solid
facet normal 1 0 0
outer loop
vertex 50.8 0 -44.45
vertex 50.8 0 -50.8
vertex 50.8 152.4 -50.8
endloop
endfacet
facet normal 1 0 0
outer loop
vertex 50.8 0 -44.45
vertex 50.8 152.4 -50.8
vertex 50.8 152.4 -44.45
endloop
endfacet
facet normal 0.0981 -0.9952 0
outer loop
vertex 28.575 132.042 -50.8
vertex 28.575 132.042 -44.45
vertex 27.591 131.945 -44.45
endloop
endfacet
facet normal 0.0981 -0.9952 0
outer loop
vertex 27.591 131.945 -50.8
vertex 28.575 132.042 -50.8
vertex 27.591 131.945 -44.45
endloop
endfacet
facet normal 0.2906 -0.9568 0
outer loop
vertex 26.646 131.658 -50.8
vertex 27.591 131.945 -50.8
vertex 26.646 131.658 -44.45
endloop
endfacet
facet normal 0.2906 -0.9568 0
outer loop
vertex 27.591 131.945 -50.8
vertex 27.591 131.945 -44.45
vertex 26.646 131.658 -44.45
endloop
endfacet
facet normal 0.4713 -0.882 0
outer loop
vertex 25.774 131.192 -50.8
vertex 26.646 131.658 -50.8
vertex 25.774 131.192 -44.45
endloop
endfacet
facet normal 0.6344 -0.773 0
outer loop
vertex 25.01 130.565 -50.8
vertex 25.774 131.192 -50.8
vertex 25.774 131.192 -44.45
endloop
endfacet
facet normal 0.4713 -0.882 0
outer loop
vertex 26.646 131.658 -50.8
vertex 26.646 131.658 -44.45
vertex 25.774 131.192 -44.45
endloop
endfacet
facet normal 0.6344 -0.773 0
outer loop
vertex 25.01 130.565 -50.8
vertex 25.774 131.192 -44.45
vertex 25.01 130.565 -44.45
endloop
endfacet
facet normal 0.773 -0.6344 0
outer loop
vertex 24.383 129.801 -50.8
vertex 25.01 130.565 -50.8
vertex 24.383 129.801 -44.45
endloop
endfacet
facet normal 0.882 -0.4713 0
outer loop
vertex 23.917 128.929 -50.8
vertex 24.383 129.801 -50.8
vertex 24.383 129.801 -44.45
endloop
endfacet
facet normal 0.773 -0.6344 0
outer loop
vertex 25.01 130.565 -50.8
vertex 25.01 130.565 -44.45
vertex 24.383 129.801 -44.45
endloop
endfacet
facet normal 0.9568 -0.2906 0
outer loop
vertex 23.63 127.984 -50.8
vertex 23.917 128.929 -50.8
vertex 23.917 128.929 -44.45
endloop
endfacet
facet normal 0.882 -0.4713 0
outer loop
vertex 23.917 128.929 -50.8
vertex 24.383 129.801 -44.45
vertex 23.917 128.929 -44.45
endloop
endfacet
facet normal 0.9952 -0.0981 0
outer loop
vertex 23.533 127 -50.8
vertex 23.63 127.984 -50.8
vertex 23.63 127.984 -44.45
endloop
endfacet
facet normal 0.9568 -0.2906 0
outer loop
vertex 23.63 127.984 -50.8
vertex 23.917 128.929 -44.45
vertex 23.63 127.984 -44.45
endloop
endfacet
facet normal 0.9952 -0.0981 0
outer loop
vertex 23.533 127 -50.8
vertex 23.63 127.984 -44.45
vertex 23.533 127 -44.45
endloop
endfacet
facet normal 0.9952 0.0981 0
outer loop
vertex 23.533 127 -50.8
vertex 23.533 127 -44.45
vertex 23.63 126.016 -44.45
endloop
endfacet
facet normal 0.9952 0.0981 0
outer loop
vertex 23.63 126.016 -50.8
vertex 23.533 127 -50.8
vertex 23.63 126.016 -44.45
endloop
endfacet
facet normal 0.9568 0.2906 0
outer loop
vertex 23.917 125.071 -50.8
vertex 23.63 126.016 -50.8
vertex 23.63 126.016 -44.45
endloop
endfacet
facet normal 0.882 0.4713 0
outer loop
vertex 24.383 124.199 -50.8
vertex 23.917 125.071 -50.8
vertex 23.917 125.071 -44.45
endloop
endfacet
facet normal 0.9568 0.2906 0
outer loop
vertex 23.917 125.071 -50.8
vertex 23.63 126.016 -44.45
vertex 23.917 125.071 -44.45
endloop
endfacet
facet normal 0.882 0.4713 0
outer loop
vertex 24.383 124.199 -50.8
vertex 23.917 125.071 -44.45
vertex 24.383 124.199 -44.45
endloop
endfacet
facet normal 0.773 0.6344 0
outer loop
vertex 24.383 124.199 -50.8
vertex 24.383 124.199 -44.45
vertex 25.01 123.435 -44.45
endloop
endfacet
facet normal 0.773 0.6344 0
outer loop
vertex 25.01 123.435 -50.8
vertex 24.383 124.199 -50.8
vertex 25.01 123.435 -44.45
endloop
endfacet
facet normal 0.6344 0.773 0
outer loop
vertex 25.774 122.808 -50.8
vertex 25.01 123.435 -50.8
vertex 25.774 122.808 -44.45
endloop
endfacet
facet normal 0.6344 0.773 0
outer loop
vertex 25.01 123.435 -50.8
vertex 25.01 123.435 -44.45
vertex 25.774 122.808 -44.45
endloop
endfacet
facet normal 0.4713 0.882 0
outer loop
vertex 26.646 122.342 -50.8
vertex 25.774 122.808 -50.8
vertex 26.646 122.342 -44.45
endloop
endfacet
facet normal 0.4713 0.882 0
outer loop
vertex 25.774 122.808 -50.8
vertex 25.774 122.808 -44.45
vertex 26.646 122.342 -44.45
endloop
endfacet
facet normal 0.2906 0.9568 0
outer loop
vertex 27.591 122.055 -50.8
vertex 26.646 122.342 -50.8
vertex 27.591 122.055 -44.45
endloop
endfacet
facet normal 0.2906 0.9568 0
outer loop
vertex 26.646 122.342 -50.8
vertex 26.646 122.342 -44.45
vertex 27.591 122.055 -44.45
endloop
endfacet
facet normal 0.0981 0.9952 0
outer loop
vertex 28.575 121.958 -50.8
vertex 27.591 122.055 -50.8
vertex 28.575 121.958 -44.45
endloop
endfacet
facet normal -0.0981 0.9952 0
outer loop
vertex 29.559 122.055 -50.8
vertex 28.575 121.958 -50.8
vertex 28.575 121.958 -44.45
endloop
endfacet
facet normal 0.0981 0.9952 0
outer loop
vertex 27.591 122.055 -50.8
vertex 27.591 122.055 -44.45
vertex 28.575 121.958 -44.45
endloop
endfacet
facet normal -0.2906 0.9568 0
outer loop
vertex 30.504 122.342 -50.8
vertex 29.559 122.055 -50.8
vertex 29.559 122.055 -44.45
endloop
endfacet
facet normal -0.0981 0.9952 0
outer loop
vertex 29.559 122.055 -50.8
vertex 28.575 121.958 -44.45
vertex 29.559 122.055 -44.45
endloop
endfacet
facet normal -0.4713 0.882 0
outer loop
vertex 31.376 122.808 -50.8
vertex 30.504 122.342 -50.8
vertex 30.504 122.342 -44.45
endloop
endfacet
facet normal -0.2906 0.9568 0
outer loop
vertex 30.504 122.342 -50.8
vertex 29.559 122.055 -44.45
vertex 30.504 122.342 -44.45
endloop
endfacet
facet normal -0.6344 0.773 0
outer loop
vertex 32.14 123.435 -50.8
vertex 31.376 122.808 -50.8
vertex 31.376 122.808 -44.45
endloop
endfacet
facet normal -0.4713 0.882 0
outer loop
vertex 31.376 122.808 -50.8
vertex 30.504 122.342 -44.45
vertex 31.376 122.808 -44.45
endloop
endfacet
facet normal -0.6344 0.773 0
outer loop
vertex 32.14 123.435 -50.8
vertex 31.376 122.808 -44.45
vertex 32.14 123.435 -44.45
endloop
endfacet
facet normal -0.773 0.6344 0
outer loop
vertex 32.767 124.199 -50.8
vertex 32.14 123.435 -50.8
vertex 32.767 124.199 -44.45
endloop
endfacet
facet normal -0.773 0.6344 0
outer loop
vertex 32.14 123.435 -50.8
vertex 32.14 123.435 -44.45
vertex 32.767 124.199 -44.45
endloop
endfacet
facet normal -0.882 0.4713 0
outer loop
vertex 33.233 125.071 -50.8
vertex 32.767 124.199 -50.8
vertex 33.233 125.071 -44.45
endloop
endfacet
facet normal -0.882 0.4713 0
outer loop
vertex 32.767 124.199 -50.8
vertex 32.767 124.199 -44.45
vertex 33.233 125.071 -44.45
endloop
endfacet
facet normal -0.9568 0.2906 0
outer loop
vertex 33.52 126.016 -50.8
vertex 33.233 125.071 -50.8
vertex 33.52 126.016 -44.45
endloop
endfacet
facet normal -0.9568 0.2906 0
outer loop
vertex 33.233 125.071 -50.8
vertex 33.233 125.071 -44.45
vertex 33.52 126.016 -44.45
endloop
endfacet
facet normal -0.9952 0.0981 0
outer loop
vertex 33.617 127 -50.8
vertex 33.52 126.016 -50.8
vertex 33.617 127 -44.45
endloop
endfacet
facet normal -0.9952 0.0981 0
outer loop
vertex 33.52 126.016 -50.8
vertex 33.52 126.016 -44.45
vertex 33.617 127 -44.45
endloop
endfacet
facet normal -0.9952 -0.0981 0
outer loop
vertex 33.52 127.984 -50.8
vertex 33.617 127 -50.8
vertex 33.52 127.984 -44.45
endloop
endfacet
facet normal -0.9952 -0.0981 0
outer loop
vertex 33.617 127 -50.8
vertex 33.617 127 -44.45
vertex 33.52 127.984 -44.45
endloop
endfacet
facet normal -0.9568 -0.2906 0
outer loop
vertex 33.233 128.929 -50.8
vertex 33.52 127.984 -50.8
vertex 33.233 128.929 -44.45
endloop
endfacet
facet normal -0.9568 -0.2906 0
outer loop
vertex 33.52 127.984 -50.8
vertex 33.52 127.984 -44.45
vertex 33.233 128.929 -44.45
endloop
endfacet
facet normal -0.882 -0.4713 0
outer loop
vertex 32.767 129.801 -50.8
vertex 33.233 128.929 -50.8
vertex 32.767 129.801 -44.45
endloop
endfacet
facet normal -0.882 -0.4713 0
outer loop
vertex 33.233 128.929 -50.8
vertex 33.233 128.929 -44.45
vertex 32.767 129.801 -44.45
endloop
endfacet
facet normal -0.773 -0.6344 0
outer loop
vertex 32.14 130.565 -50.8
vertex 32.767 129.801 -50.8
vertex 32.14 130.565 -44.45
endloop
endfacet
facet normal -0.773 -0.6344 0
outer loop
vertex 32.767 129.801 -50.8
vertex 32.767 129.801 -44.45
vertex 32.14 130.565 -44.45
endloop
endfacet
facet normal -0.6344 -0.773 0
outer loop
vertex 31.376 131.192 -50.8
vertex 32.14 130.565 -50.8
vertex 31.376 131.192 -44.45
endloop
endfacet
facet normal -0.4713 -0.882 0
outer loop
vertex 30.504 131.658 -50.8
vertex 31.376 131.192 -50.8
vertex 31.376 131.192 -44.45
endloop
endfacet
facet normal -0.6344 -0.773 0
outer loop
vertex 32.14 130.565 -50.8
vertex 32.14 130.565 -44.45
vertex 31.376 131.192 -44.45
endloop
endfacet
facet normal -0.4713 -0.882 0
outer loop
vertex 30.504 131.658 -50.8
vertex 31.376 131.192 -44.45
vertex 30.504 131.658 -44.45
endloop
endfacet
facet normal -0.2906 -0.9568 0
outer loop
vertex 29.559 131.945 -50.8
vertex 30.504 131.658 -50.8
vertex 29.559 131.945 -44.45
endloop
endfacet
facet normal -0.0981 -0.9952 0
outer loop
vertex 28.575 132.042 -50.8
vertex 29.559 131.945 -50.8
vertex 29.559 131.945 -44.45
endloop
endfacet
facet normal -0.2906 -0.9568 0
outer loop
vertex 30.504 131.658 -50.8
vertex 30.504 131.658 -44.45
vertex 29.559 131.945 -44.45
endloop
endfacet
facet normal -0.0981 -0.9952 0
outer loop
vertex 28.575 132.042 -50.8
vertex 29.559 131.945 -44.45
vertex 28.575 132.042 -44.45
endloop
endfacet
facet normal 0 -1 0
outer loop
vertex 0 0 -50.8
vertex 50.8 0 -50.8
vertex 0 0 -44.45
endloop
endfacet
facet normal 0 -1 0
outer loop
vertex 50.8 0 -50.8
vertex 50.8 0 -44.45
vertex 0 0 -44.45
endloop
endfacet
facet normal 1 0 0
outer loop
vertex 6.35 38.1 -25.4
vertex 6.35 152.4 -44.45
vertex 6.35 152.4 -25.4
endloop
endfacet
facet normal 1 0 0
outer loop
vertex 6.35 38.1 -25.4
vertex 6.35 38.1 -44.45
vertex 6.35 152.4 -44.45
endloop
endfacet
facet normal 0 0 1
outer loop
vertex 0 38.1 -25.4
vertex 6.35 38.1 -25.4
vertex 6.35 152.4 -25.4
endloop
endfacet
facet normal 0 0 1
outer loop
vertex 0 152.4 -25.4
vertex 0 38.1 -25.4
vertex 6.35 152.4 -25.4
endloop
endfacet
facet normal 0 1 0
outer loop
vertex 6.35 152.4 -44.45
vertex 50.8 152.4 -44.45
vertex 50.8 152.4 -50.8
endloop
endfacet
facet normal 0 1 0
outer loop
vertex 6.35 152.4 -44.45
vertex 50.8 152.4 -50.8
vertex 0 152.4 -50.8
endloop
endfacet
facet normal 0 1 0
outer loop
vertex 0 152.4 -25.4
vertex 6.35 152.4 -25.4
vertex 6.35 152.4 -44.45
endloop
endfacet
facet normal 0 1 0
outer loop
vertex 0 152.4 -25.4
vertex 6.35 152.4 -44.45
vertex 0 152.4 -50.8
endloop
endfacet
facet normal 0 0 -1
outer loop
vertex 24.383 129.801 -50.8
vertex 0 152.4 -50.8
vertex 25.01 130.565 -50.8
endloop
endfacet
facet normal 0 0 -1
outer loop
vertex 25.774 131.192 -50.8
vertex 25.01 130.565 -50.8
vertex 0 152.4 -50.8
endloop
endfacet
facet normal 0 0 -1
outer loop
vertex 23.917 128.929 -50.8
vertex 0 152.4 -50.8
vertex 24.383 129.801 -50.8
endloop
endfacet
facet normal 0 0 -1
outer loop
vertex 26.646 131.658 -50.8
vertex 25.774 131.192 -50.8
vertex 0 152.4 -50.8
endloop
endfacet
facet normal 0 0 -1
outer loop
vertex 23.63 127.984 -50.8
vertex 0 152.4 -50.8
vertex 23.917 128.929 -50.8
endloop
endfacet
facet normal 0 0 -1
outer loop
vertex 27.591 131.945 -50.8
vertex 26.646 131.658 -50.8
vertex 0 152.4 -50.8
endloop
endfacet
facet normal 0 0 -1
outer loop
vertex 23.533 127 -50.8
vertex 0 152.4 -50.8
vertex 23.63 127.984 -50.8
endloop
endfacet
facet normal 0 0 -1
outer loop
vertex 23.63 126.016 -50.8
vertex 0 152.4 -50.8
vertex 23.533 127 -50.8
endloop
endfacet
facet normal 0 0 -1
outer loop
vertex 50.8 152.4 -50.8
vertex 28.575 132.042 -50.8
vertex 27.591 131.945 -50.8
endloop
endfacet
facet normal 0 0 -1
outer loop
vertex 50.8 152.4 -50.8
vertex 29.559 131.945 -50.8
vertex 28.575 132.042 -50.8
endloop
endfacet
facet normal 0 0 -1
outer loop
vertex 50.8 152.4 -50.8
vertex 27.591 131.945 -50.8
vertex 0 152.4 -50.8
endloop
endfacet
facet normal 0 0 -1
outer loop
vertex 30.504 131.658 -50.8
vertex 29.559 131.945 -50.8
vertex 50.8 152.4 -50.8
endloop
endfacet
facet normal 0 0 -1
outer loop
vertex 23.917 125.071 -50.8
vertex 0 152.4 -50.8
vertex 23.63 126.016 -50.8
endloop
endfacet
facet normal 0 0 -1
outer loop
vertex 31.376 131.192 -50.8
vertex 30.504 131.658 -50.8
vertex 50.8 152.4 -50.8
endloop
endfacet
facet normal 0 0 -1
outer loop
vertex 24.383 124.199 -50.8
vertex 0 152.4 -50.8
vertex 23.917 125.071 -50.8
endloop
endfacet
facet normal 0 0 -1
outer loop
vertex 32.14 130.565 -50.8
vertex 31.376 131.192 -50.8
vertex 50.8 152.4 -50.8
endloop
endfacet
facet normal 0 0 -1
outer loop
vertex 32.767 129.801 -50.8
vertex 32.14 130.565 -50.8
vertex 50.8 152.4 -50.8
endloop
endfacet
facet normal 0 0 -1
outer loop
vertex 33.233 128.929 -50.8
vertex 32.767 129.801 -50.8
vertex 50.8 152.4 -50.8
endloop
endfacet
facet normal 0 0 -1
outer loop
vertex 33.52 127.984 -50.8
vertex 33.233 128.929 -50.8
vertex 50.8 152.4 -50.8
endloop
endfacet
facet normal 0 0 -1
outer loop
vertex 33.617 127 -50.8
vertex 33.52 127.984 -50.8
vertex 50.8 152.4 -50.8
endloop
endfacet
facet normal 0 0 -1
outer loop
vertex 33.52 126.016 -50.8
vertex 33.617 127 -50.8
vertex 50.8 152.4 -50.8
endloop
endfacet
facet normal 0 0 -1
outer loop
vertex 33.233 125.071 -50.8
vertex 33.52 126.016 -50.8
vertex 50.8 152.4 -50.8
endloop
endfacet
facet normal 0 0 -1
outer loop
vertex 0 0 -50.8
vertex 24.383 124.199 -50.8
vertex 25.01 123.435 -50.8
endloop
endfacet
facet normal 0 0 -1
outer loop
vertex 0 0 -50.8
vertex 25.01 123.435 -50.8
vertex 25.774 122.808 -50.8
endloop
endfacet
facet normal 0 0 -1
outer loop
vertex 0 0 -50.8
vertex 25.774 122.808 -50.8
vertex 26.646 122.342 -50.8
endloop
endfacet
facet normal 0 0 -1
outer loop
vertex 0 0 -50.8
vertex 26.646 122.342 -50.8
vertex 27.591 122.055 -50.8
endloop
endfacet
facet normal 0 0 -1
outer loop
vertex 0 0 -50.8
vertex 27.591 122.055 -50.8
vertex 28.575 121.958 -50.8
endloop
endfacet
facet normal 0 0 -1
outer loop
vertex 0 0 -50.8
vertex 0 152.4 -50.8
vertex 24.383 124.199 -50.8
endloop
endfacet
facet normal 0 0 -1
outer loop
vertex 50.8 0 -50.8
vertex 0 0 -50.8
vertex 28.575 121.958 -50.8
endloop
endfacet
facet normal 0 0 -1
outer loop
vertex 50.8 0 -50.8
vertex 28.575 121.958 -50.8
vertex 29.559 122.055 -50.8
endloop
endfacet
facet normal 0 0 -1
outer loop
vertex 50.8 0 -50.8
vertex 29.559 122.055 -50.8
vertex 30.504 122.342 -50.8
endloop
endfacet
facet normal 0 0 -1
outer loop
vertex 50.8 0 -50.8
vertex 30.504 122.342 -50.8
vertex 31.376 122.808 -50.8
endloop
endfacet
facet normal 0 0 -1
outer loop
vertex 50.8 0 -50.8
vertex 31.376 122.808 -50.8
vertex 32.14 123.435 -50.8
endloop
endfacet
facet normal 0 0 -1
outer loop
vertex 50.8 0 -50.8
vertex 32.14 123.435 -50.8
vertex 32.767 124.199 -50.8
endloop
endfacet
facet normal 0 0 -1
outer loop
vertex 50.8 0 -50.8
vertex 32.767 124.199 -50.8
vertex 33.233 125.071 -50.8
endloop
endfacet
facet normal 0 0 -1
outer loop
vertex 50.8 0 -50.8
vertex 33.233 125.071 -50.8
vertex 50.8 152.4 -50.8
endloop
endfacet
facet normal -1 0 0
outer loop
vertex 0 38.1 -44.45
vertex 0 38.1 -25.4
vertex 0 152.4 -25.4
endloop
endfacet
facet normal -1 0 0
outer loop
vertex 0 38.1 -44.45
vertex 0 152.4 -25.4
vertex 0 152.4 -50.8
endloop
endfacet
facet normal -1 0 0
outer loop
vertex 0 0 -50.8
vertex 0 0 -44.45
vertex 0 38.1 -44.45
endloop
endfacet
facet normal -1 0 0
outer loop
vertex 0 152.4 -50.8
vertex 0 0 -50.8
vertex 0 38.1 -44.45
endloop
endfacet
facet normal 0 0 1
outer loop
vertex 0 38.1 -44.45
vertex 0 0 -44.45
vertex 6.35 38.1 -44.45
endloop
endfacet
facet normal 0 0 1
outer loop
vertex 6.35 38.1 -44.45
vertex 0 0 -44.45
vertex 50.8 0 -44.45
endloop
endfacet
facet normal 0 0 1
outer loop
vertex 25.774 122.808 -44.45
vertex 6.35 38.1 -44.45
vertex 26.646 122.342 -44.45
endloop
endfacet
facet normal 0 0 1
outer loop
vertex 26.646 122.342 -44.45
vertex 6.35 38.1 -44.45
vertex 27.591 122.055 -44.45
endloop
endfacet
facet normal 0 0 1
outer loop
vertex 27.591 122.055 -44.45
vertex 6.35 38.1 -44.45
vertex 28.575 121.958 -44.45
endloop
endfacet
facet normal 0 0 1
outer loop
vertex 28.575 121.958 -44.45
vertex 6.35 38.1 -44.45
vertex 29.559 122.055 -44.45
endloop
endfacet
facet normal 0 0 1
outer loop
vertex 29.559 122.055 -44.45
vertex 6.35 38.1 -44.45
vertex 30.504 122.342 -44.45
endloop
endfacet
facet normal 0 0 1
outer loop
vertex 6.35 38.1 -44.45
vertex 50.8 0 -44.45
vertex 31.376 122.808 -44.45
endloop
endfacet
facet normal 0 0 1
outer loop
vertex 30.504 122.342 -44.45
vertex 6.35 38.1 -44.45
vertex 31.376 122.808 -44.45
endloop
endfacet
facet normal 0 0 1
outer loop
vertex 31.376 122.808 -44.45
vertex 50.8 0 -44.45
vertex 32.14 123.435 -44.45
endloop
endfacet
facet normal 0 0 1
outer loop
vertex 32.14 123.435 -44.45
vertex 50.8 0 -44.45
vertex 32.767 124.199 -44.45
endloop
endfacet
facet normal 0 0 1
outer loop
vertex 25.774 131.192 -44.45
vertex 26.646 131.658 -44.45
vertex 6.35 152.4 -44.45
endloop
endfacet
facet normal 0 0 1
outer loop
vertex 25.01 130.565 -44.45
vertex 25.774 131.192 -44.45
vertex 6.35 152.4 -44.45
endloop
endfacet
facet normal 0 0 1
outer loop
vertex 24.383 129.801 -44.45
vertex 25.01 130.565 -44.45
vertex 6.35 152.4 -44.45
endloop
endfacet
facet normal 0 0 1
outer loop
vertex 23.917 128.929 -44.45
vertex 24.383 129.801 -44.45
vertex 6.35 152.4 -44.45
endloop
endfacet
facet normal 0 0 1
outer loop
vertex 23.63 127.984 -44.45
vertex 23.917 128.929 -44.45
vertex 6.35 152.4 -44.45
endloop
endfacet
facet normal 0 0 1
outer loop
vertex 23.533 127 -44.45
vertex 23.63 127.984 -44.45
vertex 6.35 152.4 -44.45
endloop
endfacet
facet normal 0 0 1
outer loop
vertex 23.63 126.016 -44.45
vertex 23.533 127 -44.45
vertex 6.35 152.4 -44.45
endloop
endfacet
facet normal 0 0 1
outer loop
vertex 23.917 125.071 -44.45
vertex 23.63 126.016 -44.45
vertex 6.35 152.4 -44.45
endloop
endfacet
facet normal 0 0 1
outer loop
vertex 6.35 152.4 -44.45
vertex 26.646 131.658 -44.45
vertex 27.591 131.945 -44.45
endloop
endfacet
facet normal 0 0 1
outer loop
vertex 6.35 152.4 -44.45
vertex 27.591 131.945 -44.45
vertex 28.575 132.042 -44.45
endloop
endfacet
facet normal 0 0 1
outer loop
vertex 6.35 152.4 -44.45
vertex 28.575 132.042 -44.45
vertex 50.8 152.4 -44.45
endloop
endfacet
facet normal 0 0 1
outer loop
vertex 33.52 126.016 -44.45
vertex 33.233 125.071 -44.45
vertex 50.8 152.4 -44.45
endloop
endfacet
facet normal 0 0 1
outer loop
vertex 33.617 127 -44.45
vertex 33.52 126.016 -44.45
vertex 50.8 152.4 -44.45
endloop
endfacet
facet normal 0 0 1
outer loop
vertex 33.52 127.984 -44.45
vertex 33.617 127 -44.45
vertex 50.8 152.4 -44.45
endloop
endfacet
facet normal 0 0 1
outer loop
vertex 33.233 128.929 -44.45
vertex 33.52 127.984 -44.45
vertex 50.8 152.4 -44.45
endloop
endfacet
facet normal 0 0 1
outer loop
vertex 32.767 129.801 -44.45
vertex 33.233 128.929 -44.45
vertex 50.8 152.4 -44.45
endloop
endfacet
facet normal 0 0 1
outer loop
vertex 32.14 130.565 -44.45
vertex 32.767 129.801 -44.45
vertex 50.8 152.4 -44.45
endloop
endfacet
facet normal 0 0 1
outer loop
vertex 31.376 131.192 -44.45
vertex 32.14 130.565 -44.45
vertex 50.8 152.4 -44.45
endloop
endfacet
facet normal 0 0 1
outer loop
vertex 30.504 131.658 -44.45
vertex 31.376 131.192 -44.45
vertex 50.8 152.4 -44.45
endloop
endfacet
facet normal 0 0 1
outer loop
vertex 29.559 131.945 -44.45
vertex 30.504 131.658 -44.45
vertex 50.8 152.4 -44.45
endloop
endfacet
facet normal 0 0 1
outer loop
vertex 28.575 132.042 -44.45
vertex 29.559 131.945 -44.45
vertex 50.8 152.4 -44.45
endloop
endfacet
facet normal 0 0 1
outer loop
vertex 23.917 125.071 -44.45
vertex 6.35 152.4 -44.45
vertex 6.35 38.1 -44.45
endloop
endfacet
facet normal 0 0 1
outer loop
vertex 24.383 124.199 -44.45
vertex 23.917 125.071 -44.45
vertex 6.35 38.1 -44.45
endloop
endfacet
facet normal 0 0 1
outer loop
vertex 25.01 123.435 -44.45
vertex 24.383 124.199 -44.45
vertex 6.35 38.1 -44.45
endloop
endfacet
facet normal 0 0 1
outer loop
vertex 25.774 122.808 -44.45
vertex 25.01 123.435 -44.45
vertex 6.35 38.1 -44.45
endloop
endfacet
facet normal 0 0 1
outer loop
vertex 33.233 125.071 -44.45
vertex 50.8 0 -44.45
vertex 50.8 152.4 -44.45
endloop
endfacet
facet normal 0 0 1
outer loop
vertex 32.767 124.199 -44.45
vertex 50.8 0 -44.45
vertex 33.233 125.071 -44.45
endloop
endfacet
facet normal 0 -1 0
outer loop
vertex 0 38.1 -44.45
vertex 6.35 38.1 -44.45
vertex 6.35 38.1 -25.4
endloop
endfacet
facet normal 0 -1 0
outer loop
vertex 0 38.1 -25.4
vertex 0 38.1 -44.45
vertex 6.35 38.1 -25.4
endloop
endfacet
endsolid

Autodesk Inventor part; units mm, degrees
ref_plane "YZ Plane" through (0, 0, 0) normal (1, 0, 0) x (0, 1, 0)
ref_plane "XZ Plane" through (0, 0, 0) normal (0, 1, 0) x (-1, 0, 0)
ref_plane "XY Plane" through (0, 0, 0) normal (0, 0, 1) x (1, 0, 0)
sketch "Sketch1" plane through (0, 0, 0) normal (0, 1, 0) x (-1, 0, 0)
  line L0 (0, 0) -> (0, -50.8)
  line L1 (0, -50.8) -> (-50.8, -50.8)
  line L2 (-50.8, -50.8) -> (-50.8, -44.45)
  line L3 (-50.8, -44.45) -> (-6.35, -44.45)
  line L4 (-6.35, -44.45) -> (-6.35, 0)
  line L5 (-6.35, 0) -> (0, 0)
  dimension "d0" = 6.35
  dimension "d1" = 50.8
extrude "Extrusion1" add sketch "Sketch1" along normal blind 152.4
sketch "Sketch2" plane through (0, 0, -50.8) normal (-1, 0, 0) x (0, 0, 1)
  point P0 (50.8, 0)
sketch "Sketch3" plane through (6.35, 0, 0) normal (1, 0, 0) x (0, 0, -1)
  line L0 (0, 0) -> (50.8, 0) projected
  line L1 (44.45, 0) -> (44.45, 152.4) projected
  line L2 (0, 0) -> (44.45, 0)
  line L3 (44.45, 0) -> (44.45, 38.1)
  line L4 (44.45, 38.1) -> (0, 38.1)
  line L5 (0, 38.1) -> (0, 0)
  dimension "d5" = 38.1
extrude "Extrusion2" cut sketch "Sketch3" against normal through all
sketch "Sketch4" plane through (6.35, 152.4, 0) normal (1, 0, 0) x (0, 0, -1)
  line L0 (0, -114.3) -> (0, 0) projected
  line L1 (50.8, 0) -> (0, 0) projected
  line L2 (0, -114.3) -> (25.4, -114.3)
  line L3 (25.4, -114.3) -> (25.4, 0)
  line L4 (25.4, 0) -> (0, 0)
  line L5 (0, 0) -> (0, -114.3)
  point P0 (0, -152.4)
  dimension "d8" = 25.4
extrude "Extrusion3" cut sketch "Sketch4" against normal through all
sketch "Sketch6" plane through (50.8, 0, -50.8) normal (0, 0, -1) x (-1, 0, 0)
  line L0 (0, 152.4) -> (50.8, 152.4) projected
  line L1 (0, 0) -> (0, 152.4) projected
  point P0 (50.8, 0)
  point P1 (22.225, 127)
  dimension "d11" = 25.4
  dimension "d12" = 22.225
hole "Hole1" at (28.575, 127, -50.8) direction (0, 0, 1) diameter 10.0838 end through all clearance for "Flat Head Machine Screw (82)" size "3/8" standard "Ansi Unified Screw Threads"
properties part number "LiftAngleBracketExtensionLeft" material "Aluminum 6061"
